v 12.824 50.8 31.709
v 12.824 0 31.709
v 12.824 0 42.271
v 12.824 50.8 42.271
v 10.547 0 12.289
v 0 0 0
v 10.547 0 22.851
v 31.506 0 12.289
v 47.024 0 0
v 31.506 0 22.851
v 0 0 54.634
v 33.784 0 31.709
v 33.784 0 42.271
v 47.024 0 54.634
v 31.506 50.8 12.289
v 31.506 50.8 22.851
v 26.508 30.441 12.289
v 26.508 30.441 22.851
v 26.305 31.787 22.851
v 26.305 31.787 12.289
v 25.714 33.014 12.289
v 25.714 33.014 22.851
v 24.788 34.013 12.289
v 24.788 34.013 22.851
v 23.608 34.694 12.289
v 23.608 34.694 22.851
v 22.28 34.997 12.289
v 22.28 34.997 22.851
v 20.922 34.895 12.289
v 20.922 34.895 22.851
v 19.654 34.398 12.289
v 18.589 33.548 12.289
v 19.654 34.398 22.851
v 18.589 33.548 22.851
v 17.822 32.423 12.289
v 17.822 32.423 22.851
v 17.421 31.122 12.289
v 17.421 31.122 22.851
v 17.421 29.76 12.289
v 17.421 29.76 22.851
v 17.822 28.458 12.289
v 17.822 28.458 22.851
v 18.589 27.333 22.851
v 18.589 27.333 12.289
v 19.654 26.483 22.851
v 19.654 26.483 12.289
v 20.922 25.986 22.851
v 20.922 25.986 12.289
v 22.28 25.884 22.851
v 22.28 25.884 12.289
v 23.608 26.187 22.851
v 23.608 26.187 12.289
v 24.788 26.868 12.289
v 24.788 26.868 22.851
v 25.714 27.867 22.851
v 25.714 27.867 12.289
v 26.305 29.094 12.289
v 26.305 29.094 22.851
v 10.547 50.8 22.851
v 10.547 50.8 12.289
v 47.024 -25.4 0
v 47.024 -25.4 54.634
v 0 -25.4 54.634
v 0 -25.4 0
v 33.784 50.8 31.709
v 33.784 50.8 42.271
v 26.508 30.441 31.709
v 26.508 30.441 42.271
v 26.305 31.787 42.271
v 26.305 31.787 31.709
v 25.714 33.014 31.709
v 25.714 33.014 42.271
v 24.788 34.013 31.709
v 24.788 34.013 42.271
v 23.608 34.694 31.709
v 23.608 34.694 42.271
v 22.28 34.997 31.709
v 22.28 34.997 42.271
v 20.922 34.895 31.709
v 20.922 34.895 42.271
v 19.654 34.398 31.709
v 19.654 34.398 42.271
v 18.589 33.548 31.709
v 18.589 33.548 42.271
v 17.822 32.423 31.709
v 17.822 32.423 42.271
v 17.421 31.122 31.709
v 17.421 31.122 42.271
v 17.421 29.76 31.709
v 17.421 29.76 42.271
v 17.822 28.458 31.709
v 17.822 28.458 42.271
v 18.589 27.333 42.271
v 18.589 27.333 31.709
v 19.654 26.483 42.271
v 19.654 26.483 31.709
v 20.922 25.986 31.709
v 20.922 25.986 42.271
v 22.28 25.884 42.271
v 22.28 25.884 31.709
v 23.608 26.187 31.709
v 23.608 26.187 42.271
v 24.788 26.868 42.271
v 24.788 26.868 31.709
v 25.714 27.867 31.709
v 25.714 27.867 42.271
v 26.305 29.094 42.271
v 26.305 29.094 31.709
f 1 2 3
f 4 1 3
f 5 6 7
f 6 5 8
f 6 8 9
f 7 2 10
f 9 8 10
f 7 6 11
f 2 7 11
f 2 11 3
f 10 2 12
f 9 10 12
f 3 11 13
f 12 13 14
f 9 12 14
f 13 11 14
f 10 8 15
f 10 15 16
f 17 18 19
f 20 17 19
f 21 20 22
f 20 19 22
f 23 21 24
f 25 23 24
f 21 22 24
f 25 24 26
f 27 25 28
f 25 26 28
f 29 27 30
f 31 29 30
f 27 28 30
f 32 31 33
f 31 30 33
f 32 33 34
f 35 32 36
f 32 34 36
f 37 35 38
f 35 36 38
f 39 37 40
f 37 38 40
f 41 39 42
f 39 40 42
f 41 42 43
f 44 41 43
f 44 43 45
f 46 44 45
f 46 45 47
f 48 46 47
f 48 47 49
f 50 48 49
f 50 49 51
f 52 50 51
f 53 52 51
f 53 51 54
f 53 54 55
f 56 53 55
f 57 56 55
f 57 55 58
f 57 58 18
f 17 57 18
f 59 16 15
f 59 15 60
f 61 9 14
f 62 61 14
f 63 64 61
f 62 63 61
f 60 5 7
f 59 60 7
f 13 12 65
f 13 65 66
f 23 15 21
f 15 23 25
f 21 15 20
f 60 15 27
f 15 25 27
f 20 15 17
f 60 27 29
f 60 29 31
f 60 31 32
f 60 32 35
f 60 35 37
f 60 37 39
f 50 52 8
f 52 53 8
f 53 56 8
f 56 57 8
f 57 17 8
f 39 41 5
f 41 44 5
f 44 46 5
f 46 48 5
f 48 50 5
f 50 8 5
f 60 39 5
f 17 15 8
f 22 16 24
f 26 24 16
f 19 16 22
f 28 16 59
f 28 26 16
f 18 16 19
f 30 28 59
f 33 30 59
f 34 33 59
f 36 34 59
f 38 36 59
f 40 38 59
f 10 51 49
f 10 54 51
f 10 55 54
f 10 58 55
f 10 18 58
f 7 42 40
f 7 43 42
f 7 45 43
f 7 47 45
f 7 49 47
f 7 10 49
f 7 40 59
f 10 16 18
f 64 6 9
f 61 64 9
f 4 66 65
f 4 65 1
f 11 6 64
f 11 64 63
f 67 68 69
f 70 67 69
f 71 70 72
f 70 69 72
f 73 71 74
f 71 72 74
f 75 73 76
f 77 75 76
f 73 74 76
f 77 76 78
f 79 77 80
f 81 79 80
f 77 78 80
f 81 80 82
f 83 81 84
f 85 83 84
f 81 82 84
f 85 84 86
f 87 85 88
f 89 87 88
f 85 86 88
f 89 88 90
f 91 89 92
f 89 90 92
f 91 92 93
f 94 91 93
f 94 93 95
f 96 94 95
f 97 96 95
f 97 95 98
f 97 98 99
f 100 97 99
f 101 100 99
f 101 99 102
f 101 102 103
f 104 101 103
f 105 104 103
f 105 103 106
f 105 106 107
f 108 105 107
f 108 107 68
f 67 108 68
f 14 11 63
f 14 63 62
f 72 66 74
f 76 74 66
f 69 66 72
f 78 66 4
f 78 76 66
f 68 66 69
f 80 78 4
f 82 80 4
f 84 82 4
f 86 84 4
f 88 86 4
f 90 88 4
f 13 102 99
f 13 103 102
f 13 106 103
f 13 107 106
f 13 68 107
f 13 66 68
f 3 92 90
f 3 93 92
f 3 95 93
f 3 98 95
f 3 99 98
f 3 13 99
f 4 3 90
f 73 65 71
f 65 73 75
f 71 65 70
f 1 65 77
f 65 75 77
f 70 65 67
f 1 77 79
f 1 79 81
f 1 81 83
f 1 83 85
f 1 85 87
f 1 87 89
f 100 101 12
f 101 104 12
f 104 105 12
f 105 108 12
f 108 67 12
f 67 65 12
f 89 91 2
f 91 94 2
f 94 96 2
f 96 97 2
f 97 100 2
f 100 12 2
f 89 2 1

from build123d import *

# Parameters (mm, degrees)
F0_W     = 47.024399
F0_H     = 54.634411
F1_DEPTH = 25.4
F2_W     = 20.959661
F2_H     = 10.561608
F3_DEPTH = 50.8
F4_R     = 4.569204
F5_DEPTH = 42.271631


with BuildPart() as f1:
    # F0 (on Front) → F1 (new body)
    with BuildSketch(Plane.XZ):
        with Locations((23.512199, 27.317206)):
            Rectangle(F0_W, F0_H)
    extrude(amount=F1_DEPTH)

    # F2 (on face) → F3 (join)
    with BuildSketch(Plane(origin=(0, 0, 0), x_dir=(-1, 0, 0), z_dir=(0, 1, 0))):
        with Locations((-23.303836, 36.989827)):
            Rectangle(F2_W, F2_H)
        with Locations((-21.026581, 17.570276)):
            Rectangle(F2_W, F2_H)
    extrude(amount=F3_DEPTH)

    # F4 (on face) → F5 (cut, through all)
    with BuildSketch(Plane.XY.offset(42.270631)):
        with Locations((21.938689, 30.440513)):
            Circle(F4_R)
    extrude(amount=-F5_DEPTH, mode=Mode.SUBTRACT)


solid = f1.part
